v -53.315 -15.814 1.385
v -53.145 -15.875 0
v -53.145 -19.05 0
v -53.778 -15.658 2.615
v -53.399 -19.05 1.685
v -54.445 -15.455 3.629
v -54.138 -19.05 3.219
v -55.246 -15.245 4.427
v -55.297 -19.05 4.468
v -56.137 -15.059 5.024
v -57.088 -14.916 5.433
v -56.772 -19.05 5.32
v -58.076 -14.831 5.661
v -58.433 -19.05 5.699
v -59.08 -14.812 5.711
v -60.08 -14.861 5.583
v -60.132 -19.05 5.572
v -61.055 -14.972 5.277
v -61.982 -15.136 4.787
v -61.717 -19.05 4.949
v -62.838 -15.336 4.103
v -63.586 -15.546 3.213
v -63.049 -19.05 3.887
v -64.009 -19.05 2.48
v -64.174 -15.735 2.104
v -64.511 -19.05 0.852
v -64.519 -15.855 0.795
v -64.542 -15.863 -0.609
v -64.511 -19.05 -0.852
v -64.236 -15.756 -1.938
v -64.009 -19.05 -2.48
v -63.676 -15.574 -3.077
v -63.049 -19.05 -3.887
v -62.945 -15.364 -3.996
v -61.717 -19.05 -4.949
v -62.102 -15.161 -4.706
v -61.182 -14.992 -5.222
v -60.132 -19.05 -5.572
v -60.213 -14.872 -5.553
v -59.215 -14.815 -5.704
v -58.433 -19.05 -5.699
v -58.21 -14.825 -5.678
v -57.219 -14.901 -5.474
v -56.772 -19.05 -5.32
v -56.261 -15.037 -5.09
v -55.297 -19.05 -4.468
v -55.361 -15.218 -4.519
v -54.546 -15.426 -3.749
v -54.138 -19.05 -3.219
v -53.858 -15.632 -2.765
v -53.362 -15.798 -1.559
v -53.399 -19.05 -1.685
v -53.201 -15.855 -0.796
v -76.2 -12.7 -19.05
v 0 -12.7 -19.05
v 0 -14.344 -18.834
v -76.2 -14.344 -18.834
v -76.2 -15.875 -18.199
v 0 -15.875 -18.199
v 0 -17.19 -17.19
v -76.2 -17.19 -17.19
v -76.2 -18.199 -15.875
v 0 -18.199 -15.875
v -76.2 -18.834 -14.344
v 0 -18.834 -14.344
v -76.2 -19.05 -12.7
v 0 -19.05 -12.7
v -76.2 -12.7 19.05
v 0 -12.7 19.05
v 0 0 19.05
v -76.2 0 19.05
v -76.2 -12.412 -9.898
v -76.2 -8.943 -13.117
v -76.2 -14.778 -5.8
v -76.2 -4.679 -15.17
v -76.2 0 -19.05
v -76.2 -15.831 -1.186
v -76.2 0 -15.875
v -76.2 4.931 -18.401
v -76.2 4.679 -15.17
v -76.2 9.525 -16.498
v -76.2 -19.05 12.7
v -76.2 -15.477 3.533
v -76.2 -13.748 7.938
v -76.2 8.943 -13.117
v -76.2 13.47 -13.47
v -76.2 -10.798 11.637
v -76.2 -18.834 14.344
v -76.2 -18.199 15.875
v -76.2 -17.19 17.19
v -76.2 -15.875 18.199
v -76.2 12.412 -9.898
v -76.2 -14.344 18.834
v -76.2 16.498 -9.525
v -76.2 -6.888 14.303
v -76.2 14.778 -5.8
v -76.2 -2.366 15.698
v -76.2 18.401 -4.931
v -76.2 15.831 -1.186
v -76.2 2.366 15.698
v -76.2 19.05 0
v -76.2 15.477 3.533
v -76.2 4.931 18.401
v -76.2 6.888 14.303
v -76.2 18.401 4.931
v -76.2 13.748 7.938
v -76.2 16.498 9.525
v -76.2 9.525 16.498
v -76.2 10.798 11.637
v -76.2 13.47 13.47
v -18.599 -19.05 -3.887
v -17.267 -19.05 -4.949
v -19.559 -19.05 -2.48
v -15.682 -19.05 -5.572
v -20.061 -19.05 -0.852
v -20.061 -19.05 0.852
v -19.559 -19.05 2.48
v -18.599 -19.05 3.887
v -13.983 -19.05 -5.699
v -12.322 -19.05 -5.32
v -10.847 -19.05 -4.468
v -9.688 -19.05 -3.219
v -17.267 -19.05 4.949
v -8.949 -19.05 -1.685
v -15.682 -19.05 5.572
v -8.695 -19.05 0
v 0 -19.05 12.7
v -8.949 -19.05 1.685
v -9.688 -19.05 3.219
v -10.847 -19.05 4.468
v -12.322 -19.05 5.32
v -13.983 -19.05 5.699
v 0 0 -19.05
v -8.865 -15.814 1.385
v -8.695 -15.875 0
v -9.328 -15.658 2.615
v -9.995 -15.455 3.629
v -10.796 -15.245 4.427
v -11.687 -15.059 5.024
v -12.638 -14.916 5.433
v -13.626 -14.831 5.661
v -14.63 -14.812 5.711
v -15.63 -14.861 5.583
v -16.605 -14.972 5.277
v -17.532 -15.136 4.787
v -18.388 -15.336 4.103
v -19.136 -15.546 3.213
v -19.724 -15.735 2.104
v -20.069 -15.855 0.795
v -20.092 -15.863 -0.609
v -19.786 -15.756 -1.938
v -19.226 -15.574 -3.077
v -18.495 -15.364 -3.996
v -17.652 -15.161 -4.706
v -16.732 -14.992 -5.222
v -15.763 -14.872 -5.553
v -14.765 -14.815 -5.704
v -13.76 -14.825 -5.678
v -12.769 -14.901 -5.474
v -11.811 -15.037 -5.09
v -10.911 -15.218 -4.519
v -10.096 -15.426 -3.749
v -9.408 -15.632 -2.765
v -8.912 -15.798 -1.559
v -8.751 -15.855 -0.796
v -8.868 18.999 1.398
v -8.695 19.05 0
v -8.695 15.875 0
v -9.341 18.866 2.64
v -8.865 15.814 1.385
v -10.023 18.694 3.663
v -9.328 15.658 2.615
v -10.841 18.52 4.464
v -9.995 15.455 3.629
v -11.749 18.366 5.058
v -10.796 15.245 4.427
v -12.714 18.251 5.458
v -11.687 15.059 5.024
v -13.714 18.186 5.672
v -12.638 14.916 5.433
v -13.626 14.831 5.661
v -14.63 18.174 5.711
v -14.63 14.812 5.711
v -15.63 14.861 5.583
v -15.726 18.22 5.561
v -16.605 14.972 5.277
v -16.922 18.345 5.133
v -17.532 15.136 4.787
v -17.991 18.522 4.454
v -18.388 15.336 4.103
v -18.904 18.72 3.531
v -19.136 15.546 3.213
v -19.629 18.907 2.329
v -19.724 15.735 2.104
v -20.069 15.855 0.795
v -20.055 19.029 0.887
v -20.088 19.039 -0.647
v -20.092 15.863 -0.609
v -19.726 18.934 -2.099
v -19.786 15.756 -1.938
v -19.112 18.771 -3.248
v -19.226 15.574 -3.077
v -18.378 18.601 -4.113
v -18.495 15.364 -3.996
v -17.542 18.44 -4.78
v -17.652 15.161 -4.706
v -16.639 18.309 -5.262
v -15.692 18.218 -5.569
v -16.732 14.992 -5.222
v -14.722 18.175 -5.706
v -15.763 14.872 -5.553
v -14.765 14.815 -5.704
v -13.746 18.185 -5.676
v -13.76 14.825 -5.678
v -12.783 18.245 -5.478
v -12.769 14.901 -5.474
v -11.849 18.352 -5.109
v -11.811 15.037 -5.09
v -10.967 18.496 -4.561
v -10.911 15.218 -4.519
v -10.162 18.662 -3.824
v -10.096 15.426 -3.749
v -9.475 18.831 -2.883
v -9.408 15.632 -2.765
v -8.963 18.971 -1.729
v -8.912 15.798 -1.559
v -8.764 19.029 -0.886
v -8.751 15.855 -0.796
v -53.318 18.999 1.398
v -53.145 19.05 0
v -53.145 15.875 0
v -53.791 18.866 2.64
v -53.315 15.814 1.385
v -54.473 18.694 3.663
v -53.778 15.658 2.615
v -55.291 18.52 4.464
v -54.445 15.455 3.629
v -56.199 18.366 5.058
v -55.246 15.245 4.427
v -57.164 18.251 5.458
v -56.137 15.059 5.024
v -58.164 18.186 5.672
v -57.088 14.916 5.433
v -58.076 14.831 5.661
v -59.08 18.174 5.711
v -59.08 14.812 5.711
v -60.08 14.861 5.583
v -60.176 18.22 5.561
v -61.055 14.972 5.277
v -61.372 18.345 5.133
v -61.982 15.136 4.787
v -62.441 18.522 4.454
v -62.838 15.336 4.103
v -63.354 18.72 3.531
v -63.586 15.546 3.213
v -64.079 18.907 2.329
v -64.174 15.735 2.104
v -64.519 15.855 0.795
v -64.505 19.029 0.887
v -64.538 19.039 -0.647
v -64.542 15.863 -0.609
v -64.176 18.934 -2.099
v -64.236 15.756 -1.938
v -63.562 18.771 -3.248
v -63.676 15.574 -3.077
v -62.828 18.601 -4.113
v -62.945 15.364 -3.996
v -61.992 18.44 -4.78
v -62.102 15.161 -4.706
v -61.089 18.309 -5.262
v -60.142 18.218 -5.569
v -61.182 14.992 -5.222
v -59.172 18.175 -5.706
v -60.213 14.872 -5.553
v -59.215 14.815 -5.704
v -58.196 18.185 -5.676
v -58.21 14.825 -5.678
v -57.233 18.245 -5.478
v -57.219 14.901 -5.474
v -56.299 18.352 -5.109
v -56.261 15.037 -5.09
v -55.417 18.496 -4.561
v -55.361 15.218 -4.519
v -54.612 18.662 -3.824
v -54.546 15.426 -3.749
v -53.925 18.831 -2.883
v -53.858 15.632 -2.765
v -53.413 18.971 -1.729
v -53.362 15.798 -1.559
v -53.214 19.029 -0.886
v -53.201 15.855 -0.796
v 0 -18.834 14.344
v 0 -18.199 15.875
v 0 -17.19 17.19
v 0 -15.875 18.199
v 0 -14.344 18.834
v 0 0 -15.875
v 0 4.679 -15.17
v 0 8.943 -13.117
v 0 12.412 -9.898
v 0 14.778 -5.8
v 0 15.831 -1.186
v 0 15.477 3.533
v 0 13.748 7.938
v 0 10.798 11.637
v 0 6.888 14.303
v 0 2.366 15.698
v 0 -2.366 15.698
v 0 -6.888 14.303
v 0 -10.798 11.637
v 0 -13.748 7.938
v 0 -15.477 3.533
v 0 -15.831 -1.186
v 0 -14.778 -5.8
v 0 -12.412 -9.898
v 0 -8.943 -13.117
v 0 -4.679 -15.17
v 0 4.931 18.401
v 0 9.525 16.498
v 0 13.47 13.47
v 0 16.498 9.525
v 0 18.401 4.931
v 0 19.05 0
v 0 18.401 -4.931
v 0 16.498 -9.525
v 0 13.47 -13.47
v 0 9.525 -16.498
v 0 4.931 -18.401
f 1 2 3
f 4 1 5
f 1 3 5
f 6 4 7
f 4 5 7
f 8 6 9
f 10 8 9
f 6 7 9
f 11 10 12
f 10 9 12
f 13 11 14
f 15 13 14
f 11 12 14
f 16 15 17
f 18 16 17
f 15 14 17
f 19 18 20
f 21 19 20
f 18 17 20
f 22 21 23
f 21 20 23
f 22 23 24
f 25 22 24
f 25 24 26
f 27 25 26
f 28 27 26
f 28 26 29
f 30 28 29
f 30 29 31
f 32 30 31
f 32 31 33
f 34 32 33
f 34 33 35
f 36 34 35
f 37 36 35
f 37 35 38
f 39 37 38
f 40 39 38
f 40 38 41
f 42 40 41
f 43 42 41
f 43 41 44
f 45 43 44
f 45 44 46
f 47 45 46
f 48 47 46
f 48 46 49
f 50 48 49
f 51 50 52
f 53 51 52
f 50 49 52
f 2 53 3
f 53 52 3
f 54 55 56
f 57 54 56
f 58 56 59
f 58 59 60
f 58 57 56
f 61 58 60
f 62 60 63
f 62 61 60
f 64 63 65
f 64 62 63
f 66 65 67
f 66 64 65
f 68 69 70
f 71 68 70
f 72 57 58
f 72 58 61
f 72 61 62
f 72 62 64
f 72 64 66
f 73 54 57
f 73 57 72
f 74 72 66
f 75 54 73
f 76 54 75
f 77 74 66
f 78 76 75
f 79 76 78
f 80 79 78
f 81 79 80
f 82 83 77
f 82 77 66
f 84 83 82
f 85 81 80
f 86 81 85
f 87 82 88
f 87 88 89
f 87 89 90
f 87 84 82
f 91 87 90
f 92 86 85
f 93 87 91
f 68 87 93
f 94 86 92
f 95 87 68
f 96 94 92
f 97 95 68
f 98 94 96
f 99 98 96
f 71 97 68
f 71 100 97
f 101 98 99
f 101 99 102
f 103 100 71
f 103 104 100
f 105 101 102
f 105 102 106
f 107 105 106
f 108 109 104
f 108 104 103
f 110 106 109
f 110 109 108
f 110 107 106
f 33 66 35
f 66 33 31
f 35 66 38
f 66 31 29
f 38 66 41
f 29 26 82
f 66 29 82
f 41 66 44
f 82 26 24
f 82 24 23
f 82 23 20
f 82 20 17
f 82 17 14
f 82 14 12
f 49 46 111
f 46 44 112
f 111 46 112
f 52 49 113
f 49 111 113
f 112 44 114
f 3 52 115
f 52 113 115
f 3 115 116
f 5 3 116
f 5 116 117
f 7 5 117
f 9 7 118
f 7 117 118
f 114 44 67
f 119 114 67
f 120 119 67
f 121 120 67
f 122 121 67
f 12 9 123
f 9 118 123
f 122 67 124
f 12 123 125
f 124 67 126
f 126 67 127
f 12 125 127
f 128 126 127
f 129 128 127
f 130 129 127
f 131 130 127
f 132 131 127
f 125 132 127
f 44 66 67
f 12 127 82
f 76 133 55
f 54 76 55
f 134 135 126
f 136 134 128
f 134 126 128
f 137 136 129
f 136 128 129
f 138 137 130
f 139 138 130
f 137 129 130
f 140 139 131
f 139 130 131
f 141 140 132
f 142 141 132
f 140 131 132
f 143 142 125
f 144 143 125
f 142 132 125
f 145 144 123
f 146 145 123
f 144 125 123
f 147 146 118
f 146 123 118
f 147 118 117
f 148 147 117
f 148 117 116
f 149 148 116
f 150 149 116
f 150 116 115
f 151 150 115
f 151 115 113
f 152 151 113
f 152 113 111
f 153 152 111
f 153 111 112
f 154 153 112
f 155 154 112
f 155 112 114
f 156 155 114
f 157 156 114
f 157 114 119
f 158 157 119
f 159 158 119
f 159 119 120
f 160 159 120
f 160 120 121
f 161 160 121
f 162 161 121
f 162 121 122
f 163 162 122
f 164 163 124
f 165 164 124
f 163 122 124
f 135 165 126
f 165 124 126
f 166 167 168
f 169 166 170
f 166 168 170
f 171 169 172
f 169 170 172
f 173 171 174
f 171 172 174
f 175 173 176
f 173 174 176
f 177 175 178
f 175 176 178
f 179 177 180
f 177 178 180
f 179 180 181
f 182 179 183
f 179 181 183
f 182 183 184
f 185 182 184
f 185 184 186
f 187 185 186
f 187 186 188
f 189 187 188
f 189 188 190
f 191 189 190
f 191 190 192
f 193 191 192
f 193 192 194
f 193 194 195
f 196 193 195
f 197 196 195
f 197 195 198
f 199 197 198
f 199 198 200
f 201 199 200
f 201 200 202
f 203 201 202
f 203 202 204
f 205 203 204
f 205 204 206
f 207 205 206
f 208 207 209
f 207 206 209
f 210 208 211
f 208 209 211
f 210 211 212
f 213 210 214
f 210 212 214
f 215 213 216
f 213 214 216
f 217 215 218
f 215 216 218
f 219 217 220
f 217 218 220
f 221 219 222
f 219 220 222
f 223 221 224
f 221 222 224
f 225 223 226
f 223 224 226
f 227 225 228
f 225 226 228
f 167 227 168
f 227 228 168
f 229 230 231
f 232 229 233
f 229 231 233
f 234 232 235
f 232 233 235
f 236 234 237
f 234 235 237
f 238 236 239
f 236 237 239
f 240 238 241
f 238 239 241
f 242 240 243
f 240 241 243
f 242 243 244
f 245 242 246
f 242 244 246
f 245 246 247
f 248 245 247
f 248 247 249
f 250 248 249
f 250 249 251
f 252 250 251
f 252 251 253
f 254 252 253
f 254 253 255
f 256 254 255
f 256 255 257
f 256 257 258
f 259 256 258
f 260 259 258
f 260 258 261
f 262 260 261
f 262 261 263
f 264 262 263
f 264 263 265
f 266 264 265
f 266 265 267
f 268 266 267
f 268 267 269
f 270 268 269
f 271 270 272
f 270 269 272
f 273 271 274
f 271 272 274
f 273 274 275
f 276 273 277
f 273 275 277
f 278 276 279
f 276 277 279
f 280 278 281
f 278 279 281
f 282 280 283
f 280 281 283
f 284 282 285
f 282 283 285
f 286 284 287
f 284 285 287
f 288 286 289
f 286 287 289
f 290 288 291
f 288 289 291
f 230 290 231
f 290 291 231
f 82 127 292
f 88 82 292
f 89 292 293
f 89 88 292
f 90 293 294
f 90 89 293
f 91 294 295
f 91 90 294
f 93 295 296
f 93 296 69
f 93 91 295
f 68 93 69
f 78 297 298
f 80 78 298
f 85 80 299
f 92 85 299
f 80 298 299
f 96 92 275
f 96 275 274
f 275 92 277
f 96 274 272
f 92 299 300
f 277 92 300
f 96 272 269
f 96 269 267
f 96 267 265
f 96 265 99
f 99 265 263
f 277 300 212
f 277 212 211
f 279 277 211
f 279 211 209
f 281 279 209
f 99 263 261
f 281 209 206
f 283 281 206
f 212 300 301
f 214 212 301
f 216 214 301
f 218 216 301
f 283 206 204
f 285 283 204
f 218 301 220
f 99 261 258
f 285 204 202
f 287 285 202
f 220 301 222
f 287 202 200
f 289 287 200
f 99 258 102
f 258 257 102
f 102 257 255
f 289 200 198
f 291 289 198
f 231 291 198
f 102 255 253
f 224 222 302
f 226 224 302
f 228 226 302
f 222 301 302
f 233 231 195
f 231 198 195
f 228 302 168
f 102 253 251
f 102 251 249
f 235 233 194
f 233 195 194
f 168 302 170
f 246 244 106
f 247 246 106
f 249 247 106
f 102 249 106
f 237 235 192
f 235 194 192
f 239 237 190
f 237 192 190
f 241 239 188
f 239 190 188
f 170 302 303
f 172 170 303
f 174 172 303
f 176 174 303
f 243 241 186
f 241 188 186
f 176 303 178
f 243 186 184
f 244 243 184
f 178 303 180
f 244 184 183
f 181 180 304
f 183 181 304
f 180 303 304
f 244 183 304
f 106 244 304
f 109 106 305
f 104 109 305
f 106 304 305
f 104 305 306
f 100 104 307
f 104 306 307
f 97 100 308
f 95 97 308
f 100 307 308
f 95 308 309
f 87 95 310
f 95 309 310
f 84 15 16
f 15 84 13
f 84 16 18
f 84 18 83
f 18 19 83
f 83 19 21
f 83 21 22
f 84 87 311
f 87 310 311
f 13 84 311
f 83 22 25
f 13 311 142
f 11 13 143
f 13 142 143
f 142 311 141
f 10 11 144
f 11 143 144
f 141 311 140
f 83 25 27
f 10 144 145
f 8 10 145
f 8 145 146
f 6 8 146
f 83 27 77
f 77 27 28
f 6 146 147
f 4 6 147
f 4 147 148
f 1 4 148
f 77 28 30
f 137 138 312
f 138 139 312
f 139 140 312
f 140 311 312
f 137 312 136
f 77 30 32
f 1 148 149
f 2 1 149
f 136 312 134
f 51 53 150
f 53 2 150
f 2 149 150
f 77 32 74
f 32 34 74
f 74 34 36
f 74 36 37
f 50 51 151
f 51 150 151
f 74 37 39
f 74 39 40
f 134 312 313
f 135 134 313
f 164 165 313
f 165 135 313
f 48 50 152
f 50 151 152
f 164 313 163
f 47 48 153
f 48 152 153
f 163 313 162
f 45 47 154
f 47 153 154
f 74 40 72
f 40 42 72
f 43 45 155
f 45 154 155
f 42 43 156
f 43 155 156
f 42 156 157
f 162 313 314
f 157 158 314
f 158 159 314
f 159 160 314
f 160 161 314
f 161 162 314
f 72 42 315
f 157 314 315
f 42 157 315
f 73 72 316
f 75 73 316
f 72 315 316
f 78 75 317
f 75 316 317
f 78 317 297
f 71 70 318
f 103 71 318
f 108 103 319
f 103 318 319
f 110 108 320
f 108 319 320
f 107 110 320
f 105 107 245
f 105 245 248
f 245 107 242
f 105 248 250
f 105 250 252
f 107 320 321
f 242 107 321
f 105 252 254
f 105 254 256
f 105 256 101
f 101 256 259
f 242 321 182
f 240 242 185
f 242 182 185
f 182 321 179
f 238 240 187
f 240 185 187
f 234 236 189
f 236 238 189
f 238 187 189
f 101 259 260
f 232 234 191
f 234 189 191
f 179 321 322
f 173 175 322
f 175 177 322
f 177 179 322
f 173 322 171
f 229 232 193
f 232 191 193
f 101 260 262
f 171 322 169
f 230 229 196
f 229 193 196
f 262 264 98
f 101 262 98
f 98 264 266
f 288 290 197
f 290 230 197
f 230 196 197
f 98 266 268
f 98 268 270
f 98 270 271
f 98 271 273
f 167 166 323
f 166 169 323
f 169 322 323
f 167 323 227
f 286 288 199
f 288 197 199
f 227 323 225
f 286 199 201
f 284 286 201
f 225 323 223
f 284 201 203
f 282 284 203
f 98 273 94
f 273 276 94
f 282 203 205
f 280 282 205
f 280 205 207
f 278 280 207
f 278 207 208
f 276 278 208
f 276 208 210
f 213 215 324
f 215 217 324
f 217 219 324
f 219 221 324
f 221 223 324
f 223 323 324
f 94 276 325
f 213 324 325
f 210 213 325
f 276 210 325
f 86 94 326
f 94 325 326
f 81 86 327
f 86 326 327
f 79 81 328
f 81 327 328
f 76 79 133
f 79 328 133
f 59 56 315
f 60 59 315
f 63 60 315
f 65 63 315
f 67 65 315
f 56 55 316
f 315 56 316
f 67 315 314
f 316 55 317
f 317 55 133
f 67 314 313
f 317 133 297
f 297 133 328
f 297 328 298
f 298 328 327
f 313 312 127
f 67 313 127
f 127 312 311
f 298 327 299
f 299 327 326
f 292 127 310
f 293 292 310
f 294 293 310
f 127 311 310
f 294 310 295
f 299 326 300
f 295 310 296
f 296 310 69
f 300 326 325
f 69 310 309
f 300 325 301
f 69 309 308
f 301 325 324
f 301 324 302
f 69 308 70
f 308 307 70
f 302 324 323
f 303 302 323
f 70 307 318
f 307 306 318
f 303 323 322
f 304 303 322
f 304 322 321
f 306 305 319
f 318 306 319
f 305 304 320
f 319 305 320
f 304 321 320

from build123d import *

# Parameters (mm, degrees)
BASE_EXTRUDE_DEPTH = 76.2
SKETCH3_R          = 15.875
CUT_EXTRUDE2_DEPTH = 81.82230509
SKETCH2_R          = 5.715
CUT_EXTRUDE1_DEPTH = 88.298066989
FILLET1_R          = 6.35


with BuildPart() as part:
    # Sketch1 → Base-Extrude (new body)
    with BuildSketch(Plane(origin=(0, 0, 0), x_dir=(0, 0, -1), z_dir=(1, 0, 0))):
        with BuildLine():
            Line((19.05, 0), (19.05, -19.05))
            Line((19.05, -19.05), (-19.05, -19.05))
            Line((-19.05, -19.05), (-19.05, 0))
            ThreePointArc((-19.05, 0), (0, 19.05), (19.05, 0))
        make_face()
    extrude(amount=-BASE_EXTRUDE_DEPTH)

    # Sketch3 → Cut-Extrude2 (cut, through all)
    with BuildSketch(Plane(origin=(0, 0, 0), x_dir=(0, 0, -1), z_dir=(1, 0, 0))):
        Circle(SKETCH3_R)
    extrude(amount=-CUT_EXTRUDE2_DEPTH, mode=Mode.SUBTRACT)

    # Sketch2 → Cut-Extrude1 (cut, through all)
    with BuildSketch(Plane.XZ.offset(19.05)):
        with Locations((-14.409818925, 0)):
            Circle(SKETCH2_R)
        with Locations((-58.859818925, 0)):
            Circle(SKETCH2_R)
    extrude(amount=-CUT_EXTRUDE1_DEPTH, mode=Mode.SUBTRACT)

    # Fillet1
    fillet1_edges = [part.edges().sort_by_distance(p)[0] for p in [
        (-38.1, -19.05, 19.05),
        (-38.1, -19.05, -19.05),
    ]]
    fillet(fillet1_edges, radius=FILLET1_R)


solid = part.part
